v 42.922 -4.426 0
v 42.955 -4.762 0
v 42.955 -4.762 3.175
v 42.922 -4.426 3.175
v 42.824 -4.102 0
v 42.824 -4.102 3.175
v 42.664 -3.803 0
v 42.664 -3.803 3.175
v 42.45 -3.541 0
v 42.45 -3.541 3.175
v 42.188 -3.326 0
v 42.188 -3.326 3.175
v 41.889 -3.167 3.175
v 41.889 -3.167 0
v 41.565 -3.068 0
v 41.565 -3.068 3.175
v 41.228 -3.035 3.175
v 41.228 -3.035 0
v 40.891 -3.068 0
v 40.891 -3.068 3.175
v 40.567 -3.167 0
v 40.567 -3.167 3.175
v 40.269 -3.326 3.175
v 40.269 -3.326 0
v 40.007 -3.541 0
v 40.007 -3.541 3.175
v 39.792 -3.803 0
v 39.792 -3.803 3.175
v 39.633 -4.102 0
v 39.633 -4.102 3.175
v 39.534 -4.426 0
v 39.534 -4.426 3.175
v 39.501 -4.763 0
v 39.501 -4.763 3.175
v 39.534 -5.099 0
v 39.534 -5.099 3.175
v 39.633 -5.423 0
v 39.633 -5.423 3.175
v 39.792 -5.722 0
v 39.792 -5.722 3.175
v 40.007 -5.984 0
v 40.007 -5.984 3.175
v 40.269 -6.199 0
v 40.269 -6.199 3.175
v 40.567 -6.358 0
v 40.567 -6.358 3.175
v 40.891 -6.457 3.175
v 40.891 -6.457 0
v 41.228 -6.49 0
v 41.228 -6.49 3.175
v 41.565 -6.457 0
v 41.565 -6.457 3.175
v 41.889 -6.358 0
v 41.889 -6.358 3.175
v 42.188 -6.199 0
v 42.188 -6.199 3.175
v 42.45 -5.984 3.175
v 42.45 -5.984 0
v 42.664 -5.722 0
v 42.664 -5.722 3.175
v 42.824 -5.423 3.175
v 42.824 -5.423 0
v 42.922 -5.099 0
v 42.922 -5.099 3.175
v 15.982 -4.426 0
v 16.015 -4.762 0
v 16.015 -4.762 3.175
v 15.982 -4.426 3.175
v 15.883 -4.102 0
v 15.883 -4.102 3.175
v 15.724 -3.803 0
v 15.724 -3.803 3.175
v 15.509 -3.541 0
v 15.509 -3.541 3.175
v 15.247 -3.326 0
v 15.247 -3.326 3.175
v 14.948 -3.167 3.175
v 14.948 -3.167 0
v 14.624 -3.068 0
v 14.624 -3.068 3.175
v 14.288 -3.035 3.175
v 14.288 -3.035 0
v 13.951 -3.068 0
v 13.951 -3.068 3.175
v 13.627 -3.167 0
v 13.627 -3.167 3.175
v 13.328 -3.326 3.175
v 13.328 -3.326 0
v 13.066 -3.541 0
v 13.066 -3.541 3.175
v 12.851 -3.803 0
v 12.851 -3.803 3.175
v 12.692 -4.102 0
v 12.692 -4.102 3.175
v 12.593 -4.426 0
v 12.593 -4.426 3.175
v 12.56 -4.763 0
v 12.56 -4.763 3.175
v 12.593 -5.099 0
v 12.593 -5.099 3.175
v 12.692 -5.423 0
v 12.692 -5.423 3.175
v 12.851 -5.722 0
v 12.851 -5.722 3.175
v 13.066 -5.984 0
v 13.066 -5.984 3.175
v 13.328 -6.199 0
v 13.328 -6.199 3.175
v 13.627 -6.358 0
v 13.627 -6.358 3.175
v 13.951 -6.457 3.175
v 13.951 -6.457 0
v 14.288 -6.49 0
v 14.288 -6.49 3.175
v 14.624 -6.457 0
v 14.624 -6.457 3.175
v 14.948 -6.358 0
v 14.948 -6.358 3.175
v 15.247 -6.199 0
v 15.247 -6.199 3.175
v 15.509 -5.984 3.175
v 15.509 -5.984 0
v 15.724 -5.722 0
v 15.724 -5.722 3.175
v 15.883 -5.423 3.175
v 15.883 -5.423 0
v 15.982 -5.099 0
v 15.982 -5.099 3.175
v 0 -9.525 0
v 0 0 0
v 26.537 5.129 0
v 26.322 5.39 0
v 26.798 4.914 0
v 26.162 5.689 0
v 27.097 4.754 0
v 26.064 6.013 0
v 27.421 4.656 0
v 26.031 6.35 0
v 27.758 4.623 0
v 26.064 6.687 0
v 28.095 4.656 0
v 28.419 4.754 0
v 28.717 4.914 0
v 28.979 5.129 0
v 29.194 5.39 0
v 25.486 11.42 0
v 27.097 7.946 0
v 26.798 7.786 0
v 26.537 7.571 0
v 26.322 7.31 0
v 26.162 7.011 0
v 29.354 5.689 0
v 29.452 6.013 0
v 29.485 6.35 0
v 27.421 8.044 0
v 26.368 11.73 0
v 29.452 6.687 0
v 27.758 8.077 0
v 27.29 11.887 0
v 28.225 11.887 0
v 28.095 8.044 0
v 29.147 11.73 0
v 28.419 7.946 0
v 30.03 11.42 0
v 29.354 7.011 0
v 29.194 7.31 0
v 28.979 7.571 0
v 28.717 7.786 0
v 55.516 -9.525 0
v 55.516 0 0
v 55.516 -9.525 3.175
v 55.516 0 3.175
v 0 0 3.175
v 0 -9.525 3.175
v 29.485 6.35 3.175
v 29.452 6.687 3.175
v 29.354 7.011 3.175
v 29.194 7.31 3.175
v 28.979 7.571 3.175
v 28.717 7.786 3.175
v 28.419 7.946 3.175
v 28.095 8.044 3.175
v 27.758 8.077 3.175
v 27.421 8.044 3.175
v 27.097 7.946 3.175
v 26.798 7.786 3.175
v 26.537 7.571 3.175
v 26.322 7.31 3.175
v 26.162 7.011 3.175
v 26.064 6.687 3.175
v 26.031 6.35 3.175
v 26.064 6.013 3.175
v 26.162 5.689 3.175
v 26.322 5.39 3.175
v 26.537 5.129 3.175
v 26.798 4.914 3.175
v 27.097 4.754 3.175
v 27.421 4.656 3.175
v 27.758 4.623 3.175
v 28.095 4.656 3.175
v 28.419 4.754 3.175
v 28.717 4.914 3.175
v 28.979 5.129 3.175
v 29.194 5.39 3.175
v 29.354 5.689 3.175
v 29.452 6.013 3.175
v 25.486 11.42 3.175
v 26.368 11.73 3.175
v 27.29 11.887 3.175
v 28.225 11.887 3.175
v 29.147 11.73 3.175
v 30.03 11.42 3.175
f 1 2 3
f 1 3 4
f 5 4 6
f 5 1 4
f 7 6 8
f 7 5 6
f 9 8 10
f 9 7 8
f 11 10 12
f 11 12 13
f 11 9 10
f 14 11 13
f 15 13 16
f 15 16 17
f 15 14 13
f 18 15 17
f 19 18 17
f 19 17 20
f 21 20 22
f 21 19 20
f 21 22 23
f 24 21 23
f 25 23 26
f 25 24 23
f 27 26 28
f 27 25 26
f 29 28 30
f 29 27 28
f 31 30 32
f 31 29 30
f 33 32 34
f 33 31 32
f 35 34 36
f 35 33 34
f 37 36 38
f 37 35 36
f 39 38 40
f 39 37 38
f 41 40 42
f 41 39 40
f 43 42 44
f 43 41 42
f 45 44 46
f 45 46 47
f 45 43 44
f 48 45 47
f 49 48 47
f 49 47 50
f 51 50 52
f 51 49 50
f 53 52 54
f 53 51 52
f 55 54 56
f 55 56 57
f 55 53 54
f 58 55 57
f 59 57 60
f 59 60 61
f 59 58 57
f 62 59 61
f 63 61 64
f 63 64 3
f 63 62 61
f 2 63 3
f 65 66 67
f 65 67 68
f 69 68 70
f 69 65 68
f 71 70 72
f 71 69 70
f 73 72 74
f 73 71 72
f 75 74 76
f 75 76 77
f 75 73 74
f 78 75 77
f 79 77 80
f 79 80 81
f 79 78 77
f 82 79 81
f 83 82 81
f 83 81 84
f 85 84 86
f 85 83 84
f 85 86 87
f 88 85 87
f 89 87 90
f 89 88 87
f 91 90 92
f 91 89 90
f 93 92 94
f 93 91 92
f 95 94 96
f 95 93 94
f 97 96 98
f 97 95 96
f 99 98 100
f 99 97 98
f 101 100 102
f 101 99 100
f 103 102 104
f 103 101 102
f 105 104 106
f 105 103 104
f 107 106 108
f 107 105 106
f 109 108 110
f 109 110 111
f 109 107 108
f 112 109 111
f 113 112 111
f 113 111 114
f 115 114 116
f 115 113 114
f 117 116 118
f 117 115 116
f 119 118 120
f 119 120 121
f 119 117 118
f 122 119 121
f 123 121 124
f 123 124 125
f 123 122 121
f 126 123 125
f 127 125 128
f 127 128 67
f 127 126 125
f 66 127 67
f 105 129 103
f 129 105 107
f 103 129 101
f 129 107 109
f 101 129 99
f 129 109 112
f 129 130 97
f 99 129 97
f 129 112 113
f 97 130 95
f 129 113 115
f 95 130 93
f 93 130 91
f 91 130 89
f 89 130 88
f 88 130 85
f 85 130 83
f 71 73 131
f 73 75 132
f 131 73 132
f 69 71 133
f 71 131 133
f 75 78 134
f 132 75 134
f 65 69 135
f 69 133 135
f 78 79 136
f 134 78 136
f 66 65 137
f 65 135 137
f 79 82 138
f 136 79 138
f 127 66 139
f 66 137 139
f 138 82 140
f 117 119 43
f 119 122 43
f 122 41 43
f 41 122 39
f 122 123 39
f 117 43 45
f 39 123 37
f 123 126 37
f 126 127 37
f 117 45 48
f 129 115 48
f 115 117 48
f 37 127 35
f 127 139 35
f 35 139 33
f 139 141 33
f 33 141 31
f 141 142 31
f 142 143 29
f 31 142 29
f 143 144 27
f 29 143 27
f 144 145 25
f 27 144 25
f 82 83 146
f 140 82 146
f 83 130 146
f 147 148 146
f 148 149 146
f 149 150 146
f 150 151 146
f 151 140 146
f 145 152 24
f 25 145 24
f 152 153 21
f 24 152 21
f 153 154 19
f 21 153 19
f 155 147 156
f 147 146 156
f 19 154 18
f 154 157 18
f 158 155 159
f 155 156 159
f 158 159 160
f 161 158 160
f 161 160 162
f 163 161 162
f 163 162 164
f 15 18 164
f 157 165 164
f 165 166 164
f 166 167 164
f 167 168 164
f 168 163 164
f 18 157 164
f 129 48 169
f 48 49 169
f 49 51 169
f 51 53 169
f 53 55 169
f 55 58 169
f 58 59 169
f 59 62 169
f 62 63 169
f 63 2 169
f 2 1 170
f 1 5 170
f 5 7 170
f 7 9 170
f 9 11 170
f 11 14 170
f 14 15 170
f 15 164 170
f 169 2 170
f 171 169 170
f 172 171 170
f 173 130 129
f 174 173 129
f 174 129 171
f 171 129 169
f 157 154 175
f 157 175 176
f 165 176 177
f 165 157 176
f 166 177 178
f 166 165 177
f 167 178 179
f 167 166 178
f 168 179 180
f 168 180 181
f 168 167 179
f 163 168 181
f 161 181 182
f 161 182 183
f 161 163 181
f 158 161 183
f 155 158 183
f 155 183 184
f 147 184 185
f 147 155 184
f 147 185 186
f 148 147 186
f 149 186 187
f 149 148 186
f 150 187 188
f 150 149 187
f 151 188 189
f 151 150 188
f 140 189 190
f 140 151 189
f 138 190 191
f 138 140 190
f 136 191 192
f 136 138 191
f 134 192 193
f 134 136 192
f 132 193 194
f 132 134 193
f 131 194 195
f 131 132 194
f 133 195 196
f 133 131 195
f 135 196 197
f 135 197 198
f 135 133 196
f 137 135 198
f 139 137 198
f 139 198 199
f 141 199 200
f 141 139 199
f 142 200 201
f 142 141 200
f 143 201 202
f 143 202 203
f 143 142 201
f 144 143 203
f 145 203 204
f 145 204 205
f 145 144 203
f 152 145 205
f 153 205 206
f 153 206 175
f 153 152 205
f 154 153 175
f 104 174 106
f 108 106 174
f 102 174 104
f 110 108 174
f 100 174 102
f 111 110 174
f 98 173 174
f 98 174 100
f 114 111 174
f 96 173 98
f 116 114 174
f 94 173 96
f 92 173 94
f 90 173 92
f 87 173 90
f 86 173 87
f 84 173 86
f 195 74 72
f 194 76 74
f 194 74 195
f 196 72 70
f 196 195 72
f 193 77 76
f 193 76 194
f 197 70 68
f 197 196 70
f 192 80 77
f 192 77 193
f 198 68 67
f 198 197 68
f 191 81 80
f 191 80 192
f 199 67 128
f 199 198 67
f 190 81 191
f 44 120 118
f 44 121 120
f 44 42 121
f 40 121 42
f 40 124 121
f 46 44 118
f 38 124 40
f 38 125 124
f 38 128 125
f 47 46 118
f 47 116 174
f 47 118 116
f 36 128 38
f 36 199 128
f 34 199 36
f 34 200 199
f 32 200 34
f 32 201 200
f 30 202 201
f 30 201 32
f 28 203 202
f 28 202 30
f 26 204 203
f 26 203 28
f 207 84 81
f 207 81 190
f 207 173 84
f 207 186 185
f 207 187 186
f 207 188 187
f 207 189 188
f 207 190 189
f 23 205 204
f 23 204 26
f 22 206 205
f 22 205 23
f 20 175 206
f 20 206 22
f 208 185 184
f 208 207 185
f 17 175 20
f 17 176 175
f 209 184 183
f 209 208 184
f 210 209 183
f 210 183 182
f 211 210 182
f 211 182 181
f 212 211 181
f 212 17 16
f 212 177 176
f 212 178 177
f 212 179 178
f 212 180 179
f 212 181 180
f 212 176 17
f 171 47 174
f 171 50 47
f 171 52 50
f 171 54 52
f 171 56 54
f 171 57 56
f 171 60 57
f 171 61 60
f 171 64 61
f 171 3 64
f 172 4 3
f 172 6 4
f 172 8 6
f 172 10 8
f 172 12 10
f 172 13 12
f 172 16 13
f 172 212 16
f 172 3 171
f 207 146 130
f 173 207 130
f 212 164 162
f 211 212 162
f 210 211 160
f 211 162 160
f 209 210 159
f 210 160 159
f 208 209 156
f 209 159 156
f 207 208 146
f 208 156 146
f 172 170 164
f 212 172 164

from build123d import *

# Parameters (mm, degrees)
F0_R     = 1.7272
F1_DEPTH = 3.175


with BuildPart() as f1:
    # F0 (on Top) → F1 (new body)
    with BuildSketch(Plane.XY):
        with BuildLine():
            Line((0, 0), (0, -9.525))
            Line((0, -9.525), (55.515764, -9.525))
            Line((55.515764, -9.525), (55.515764, 0))
            Line((55.515764, 0), (30.030001, 11.420443))
            ThreePointArc((30.030001, 11.420443), (27.757882, 11.90625), (25.485763, 11.420443))
            Line((25.485763, 11.420443), (0, 0))
        make_face()
        with Locations((14.2875, -4.7625)):
            Circle(F0_R, mode=Mode.SUBTRACT)
        with Locations((41.228264, -4.7625)):
            Circle(F0_R, mode=Mode.SUBTRACT)
        with Locations((27.757882, 6.35)):
            Circle(F0_R, mode=Mode.SUBTRACT)
    extrude(amount=F1_DEPTH)


solid = f1.part
